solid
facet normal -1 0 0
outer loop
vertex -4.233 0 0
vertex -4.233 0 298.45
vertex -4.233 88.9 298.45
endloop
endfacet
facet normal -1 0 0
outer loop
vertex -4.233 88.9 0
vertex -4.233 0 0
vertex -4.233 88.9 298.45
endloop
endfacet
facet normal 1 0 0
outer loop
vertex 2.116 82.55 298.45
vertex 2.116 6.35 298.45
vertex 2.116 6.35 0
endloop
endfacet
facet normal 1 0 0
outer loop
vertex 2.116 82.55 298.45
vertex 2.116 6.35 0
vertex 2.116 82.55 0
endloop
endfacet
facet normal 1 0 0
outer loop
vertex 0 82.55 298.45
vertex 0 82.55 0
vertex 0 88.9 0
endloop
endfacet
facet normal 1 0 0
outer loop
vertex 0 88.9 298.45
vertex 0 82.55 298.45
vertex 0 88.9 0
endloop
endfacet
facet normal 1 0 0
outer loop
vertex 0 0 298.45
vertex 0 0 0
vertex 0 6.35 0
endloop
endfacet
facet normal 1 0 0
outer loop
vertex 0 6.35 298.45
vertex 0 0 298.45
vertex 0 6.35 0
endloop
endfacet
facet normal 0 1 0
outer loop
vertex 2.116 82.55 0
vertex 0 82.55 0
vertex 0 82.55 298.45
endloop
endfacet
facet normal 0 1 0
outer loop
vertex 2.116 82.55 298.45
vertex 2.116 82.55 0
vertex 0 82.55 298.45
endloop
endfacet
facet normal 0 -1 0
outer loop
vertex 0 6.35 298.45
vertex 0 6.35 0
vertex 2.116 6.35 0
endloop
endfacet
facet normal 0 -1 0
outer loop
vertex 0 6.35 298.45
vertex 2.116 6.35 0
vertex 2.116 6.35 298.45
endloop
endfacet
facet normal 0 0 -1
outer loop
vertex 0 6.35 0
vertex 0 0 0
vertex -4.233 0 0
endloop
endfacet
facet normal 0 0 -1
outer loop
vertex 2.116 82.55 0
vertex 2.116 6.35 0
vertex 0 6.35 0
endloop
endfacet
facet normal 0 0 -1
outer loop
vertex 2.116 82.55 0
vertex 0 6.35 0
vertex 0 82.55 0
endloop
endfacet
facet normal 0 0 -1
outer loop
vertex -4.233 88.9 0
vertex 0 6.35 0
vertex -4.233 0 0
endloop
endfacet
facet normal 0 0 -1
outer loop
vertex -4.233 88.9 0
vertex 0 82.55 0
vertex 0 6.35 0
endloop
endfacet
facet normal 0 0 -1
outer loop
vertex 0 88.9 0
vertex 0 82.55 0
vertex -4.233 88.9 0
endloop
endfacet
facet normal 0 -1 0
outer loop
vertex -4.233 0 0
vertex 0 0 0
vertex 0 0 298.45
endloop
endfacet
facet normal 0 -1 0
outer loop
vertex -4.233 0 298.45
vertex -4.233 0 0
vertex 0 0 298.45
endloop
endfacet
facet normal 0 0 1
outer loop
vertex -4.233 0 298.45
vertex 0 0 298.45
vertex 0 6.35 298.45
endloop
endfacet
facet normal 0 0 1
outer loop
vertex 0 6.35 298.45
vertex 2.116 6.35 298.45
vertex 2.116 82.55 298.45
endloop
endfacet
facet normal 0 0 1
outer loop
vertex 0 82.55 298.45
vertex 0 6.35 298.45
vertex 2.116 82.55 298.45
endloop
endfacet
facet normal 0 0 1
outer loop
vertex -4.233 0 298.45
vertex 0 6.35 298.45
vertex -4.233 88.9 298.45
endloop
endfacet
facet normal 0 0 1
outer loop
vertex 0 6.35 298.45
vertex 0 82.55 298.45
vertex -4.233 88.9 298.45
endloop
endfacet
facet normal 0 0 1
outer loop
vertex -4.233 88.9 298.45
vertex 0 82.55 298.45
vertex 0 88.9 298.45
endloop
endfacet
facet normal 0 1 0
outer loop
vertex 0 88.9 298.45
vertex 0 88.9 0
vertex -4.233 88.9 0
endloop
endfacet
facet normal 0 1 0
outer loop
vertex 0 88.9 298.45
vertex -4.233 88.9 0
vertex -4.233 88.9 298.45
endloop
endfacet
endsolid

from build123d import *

# Parameters (mm, degrees)
F0_W     = 88.9
F0_H     = 298.45
F2_DEPTH = 4.233418
F1_W     = 76.2
F1_H     = 298.45
F3_DEPTH = 2.116455


with BuildPart() as f2:
    # F0 (on Right) → F2 (new body)
    with BuildSketch(Plane.YZ):
        with Locations((44.45, 149.225)):
            Rectangle(F0_W, F0_H)
    extrude(amount=-F2_DEPTH)

    # F1 (on Right) → F3 (join)
    with BuildSketch(Plane.YZ):
        with Locations((44.45, 149.225)):
            Rectangle(F1_W, F1_H)
    extrude(amount=F3_DEPTH)


solid = f2.part
